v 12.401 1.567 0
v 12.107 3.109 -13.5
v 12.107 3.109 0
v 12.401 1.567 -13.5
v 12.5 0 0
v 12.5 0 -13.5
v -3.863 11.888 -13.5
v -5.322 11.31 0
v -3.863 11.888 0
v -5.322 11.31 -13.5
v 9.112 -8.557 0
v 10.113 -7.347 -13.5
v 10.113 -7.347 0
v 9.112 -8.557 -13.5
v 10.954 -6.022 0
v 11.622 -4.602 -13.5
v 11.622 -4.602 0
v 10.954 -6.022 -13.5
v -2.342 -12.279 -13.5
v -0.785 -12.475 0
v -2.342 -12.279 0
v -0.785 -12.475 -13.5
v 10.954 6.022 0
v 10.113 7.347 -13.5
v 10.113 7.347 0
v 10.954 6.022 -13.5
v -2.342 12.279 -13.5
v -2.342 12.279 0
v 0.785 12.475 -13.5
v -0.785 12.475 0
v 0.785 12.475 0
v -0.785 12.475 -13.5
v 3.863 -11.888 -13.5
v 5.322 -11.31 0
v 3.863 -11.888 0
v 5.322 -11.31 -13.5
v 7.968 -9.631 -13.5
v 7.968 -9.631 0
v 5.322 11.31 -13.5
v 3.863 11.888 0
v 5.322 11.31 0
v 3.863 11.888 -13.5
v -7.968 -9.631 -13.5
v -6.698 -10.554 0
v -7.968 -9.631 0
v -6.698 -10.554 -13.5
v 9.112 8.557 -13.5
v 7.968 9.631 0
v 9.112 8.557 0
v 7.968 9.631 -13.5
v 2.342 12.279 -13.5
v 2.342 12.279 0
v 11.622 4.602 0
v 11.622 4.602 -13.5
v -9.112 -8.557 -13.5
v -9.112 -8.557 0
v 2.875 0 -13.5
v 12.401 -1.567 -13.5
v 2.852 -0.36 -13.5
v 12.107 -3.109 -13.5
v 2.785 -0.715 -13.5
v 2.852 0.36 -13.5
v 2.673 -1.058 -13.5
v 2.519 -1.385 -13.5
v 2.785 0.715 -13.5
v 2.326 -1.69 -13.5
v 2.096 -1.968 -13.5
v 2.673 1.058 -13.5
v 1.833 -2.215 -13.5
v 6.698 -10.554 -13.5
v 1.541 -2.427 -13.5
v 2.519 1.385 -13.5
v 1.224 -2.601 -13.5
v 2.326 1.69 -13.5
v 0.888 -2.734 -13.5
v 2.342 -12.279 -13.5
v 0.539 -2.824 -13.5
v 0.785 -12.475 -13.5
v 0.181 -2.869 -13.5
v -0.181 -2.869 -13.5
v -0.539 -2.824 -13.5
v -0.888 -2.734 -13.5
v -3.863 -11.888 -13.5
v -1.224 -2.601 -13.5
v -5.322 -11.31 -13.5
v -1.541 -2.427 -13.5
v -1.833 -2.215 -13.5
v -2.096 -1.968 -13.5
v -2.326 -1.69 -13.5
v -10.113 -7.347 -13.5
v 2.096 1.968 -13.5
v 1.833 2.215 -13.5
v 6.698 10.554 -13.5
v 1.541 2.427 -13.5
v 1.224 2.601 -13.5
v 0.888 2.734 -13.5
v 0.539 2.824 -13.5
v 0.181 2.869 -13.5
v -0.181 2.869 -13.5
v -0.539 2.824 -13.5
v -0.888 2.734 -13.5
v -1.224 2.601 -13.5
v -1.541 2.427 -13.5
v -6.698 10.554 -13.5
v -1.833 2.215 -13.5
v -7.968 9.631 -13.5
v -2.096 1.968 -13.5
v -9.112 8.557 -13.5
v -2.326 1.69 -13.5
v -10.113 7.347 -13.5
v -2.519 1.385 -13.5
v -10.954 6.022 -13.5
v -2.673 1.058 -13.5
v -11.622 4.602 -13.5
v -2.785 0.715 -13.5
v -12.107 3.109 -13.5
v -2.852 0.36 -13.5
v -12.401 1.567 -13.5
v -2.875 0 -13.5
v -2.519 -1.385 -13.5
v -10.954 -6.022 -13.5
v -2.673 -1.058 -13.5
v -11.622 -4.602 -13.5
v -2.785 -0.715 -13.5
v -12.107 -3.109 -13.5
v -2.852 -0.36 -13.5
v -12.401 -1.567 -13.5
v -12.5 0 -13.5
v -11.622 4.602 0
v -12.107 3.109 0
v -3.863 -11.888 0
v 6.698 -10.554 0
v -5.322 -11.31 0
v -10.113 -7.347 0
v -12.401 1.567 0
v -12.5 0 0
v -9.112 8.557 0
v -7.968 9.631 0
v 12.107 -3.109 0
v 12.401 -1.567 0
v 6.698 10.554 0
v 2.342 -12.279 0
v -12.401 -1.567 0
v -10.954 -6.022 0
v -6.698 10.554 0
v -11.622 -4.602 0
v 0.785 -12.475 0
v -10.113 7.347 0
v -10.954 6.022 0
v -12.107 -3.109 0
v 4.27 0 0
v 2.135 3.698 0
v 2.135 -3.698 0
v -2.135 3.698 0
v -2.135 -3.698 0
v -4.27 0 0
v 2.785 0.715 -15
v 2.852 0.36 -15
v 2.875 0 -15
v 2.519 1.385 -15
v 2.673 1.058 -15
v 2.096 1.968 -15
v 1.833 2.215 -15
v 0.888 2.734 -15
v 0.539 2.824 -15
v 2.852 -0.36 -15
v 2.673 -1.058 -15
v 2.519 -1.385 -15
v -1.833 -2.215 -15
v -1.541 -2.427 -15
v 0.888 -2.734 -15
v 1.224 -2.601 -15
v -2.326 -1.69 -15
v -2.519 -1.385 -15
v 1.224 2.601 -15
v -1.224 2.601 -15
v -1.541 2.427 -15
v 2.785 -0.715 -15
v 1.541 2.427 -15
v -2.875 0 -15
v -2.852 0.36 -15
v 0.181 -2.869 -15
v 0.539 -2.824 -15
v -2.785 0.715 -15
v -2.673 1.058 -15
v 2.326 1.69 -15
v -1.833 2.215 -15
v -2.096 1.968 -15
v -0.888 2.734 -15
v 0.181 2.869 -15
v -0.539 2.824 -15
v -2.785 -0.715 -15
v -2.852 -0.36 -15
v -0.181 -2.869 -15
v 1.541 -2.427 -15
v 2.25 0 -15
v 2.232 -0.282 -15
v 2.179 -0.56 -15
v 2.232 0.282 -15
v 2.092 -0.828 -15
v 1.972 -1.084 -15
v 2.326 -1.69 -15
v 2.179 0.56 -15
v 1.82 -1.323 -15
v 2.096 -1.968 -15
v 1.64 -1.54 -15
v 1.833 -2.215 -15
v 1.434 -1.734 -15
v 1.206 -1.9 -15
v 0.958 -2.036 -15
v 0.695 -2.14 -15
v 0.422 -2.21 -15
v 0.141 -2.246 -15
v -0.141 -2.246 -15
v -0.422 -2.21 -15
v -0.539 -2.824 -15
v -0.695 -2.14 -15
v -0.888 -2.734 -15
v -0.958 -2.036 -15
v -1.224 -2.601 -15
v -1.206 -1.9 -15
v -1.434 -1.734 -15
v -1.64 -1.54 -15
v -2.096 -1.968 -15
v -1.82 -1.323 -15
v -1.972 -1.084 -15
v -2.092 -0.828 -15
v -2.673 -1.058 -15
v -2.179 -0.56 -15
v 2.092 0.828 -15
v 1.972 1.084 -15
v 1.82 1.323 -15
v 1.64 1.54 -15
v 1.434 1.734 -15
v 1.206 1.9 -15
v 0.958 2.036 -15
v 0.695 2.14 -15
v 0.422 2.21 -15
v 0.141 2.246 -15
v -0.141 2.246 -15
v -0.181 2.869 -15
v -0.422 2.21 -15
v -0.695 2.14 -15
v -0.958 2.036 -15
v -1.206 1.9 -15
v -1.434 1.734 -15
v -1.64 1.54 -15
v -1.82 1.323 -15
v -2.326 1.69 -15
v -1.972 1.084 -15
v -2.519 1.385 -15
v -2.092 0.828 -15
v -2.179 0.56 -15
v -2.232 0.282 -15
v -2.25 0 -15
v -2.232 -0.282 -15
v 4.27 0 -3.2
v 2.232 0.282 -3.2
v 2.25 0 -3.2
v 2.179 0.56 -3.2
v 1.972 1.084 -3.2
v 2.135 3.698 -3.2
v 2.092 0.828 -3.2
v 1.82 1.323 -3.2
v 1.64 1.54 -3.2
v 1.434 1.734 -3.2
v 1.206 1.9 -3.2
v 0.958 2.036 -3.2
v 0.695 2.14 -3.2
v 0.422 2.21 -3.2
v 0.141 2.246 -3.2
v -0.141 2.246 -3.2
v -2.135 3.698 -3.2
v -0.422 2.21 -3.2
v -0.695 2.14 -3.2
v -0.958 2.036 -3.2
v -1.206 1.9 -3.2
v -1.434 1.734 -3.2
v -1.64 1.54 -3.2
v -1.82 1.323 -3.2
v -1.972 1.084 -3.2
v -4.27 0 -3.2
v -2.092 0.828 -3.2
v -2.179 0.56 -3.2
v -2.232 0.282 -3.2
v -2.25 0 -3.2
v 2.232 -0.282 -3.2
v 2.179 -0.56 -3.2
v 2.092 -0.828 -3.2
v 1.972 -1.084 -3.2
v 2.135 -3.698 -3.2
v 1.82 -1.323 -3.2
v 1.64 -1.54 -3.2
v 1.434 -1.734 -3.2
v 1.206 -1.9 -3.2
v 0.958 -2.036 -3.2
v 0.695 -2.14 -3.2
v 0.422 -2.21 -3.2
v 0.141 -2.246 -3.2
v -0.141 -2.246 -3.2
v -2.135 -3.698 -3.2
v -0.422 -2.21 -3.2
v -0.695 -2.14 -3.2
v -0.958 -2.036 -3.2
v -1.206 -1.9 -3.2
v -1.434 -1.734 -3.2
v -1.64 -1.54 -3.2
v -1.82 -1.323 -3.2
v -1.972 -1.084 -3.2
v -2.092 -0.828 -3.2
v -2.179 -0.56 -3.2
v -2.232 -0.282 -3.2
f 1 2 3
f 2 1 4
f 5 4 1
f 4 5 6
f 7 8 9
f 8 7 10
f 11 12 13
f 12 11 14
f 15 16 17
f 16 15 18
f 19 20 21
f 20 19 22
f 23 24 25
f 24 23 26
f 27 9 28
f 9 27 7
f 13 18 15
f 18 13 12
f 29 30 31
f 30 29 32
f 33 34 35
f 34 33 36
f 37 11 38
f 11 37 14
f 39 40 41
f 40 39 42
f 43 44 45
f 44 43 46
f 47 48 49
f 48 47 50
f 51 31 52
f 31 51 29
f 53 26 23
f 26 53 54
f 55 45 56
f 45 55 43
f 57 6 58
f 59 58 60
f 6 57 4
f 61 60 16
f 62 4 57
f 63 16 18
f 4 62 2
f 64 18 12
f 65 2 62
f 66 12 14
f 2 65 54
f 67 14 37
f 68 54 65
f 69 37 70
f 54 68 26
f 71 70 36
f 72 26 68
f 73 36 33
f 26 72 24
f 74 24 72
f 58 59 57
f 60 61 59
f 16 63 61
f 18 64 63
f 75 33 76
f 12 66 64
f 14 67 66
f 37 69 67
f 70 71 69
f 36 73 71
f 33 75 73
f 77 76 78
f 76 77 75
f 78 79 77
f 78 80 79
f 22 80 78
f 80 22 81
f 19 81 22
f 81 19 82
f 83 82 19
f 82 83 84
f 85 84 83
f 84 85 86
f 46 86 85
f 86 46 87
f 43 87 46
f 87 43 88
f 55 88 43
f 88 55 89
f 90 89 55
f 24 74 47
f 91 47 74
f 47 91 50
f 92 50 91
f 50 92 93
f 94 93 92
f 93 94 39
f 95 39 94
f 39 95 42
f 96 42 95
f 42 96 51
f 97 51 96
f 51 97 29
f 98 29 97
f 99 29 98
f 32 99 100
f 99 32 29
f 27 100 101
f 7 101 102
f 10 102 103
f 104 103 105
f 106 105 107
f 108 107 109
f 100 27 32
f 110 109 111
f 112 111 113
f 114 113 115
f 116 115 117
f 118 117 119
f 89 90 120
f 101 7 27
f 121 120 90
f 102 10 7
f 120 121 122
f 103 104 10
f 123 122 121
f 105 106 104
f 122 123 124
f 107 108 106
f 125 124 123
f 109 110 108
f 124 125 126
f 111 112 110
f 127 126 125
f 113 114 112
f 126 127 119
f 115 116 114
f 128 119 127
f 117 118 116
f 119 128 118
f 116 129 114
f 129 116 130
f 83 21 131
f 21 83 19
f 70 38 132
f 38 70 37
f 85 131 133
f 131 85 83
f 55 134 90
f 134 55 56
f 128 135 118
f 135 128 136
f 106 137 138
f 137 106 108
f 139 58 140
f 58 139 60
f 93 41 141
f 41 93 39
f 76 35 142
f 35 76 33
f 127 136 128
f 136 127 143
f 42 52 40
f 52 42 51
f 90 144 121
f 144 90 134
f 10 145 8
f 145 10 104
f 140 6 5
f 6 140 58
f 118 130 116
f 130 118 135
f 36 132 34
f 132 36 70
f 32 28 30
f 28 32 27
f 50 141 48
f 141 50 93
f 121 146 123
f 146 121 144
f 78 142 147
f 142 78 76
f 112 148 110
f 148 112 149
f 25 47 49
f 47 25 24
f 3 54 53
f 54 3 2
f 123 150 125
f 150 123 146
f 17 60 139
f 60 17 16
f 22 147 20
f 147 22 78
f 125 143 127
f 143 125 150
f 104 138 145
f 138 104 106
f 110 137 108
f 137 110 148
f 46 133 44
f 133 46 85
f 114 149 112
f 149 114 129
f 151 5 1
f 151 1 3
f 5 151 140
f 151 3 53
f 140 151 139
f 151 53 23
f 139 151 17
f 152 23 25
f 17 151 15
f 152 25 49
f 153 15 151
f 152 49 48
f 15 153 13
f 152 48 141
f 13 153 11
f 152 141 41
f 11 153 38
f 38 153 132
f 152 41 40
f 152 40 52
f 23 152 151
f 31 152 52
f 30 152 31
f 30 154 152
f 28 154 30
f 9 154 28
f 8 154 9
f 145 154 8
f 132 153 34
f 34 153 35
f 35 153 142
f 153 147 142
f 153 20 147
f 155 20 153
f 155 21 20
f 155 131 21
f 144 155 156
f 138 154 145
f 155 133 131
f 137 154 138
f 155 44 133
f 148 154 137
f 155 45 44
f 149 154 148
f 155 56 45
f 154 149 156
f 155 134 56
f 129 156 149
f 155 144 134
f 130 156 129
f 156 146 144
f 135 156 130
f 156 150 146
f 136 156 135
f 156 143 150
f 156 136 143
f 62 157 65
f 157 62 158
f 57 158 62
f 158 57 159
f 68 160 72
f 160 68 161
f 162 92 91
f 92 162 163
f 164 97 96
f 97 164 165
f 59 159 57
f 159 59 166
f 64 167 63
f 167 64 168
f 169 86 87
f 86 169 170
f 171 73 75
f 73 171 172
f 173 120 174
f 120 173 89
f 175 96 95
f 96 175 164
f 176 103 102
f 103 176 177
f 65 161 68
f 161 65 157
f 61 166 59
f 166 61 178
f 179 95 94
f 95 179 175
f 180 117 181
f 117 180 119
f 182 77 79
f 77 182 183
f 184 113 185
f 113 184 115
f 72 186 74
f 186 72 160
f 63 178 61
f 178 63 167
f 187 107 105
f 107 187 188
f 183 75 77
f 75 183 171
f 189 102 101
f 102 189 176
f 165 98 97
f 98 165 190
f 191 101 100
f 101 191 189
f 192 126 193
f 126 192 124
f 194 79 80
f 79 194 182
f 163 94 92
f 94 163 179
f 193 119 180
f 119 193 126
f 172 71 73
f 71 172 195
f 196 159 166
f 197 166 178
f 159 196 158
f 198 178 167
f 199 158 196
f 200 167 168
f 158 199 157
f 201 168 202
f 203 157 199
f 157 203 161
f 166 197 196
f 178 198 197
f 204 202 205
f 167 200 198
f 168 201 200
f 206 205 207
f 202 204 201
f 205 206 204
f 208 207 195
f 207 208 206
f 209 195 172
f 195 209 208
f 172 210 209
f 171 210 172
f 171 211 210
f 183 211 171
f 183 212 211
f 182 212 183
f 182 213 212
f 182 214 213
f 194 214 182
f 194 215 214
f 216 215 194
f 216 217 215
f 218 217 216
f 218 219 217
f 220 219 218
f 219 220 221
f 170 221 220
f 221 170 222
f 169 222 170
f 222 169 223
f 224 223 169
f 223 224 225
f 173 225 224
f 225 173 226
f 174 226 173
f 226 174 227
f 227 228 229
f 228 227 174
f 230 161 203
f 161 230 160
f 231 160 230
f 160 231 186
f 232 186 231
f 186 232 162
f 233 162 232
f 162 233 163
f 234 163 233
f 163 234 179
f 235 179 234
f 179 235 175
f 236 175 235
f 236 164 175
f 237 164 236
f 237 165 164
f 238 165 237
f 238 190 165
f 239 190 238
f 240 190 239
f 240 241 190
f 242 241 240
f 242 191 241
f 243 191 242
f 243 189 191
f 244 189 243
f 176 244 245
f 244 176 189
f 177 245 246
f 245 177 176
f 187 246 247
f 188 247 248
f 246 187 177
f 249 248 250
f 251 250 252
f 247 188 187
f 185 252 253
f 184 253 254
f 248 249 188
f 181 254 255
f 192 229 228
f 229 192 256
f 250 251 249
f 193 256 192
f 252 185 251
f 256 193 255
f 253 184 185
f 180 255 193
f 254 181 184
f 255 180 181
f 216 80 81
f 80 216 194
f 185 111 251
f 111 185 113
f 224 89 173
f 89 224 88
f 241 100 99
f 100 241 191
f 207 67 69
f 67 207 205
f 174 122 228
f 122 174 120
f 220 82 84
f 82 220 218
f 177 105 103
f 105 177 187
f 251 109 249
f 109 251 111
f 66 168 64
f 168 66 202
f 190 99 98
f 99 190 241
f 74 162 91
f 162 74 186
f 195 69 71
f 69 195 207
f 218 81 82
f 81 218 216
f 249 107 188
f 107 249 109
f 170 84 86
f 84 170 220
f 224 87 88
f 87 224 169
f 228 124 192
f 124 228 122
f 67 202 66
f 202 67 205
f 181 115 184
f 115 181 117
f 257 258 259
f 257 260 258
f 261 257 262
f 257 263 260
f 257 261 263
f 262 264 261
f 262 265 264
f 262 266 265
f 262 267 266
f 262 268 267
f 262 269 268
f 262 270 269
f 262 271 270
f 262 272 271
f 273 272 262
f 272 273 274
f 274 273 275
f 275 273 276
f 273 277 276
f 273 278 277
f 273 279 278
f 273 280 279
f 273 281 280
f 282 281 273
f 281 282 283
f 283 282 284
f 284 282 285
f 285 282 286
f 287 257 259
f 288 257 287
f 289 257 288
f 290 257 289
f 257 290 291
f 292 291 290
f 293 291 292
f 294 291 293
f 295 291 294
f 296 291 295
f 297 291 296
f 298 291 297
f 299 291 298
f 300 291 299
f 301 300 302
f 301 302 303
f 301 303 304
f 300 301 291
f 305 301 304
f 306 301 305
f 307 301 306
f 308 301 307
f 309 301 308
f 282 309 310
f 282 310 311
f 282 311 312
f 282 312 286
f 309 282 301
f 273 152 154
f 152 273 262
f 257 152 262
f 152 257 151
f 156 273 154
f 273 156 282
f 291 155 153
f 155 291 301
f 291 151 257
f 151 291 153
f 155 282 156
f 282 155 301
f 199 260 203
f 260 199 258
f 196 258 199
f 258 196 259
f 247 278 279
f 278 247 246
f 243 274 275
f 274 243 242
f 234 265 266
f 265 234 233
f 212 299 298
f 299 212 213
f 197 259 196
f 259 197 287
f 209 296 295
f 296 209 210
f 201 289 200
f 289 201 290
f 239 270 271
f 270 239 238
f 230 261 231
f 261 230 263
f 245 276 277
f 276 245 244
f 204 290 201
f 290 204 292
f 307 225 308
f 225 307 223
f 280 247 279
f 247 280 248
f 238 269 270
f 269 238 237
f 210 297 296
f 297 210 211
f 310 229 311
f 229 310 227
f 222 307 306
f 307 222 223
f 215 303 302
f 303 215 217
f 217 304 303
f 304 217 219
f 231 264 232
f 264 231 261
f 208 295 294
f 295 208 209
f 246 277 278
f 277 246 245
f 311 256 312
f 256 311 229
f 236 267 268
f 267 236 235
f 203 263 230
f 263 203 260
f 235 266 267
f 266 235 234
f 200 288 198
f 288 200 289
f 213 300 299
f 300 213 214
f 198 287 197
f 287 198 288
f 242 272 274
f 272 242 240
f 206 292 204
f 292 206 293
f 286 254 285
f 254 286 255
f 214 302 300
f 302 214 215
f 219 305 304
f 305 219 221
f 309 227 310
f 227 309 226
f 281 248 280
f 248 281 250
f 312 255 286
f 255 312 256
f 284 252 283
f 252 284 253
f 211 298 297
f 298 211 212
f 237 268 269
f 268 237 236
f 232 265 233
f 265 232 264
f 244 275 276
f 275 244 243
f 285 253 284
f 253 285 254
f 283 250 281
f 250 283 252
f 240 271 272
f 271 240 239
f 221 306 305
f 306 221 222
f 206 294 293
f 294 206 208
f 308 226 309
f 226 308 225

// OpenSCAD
$fn = 50;


difference() {
	union() {
		translate(v = [0, 0, -13.5000000000]) {
			cylinder(h = 13.5000000000, r = 12.5000000000);
		}
		#translate(v = [0, 0, -15.0000000000]) {
			cylinder(h = 15, r = 2.8750000000);
		}
	}
	union() {
		translate(v = [0, 0, 0]) {
			rotate(a = [0, 0, 0]) {
				difference() {
					union() {
						translate(v = [0, 0, -3.2000000000]) {
							linear_extrude(height = 3.2000000000) {
								polygon(points = [[4.2698000000, 0.0000000000], [2.1349000000, 3.6977552691], [-2.1349000000, 3.6977552691], [-4.2698000000, 0.0000000000], [-2.1349000000, -3.6977552691], [2.1349000000, -3.6977552691]]);
							}
						}
					}
					union();
				}
			}
		}
		#translate(v = [0, 0, -100.0000000000]) {
			cylinder(h = 200, r = 2.2500000000);
		}
	}
}
